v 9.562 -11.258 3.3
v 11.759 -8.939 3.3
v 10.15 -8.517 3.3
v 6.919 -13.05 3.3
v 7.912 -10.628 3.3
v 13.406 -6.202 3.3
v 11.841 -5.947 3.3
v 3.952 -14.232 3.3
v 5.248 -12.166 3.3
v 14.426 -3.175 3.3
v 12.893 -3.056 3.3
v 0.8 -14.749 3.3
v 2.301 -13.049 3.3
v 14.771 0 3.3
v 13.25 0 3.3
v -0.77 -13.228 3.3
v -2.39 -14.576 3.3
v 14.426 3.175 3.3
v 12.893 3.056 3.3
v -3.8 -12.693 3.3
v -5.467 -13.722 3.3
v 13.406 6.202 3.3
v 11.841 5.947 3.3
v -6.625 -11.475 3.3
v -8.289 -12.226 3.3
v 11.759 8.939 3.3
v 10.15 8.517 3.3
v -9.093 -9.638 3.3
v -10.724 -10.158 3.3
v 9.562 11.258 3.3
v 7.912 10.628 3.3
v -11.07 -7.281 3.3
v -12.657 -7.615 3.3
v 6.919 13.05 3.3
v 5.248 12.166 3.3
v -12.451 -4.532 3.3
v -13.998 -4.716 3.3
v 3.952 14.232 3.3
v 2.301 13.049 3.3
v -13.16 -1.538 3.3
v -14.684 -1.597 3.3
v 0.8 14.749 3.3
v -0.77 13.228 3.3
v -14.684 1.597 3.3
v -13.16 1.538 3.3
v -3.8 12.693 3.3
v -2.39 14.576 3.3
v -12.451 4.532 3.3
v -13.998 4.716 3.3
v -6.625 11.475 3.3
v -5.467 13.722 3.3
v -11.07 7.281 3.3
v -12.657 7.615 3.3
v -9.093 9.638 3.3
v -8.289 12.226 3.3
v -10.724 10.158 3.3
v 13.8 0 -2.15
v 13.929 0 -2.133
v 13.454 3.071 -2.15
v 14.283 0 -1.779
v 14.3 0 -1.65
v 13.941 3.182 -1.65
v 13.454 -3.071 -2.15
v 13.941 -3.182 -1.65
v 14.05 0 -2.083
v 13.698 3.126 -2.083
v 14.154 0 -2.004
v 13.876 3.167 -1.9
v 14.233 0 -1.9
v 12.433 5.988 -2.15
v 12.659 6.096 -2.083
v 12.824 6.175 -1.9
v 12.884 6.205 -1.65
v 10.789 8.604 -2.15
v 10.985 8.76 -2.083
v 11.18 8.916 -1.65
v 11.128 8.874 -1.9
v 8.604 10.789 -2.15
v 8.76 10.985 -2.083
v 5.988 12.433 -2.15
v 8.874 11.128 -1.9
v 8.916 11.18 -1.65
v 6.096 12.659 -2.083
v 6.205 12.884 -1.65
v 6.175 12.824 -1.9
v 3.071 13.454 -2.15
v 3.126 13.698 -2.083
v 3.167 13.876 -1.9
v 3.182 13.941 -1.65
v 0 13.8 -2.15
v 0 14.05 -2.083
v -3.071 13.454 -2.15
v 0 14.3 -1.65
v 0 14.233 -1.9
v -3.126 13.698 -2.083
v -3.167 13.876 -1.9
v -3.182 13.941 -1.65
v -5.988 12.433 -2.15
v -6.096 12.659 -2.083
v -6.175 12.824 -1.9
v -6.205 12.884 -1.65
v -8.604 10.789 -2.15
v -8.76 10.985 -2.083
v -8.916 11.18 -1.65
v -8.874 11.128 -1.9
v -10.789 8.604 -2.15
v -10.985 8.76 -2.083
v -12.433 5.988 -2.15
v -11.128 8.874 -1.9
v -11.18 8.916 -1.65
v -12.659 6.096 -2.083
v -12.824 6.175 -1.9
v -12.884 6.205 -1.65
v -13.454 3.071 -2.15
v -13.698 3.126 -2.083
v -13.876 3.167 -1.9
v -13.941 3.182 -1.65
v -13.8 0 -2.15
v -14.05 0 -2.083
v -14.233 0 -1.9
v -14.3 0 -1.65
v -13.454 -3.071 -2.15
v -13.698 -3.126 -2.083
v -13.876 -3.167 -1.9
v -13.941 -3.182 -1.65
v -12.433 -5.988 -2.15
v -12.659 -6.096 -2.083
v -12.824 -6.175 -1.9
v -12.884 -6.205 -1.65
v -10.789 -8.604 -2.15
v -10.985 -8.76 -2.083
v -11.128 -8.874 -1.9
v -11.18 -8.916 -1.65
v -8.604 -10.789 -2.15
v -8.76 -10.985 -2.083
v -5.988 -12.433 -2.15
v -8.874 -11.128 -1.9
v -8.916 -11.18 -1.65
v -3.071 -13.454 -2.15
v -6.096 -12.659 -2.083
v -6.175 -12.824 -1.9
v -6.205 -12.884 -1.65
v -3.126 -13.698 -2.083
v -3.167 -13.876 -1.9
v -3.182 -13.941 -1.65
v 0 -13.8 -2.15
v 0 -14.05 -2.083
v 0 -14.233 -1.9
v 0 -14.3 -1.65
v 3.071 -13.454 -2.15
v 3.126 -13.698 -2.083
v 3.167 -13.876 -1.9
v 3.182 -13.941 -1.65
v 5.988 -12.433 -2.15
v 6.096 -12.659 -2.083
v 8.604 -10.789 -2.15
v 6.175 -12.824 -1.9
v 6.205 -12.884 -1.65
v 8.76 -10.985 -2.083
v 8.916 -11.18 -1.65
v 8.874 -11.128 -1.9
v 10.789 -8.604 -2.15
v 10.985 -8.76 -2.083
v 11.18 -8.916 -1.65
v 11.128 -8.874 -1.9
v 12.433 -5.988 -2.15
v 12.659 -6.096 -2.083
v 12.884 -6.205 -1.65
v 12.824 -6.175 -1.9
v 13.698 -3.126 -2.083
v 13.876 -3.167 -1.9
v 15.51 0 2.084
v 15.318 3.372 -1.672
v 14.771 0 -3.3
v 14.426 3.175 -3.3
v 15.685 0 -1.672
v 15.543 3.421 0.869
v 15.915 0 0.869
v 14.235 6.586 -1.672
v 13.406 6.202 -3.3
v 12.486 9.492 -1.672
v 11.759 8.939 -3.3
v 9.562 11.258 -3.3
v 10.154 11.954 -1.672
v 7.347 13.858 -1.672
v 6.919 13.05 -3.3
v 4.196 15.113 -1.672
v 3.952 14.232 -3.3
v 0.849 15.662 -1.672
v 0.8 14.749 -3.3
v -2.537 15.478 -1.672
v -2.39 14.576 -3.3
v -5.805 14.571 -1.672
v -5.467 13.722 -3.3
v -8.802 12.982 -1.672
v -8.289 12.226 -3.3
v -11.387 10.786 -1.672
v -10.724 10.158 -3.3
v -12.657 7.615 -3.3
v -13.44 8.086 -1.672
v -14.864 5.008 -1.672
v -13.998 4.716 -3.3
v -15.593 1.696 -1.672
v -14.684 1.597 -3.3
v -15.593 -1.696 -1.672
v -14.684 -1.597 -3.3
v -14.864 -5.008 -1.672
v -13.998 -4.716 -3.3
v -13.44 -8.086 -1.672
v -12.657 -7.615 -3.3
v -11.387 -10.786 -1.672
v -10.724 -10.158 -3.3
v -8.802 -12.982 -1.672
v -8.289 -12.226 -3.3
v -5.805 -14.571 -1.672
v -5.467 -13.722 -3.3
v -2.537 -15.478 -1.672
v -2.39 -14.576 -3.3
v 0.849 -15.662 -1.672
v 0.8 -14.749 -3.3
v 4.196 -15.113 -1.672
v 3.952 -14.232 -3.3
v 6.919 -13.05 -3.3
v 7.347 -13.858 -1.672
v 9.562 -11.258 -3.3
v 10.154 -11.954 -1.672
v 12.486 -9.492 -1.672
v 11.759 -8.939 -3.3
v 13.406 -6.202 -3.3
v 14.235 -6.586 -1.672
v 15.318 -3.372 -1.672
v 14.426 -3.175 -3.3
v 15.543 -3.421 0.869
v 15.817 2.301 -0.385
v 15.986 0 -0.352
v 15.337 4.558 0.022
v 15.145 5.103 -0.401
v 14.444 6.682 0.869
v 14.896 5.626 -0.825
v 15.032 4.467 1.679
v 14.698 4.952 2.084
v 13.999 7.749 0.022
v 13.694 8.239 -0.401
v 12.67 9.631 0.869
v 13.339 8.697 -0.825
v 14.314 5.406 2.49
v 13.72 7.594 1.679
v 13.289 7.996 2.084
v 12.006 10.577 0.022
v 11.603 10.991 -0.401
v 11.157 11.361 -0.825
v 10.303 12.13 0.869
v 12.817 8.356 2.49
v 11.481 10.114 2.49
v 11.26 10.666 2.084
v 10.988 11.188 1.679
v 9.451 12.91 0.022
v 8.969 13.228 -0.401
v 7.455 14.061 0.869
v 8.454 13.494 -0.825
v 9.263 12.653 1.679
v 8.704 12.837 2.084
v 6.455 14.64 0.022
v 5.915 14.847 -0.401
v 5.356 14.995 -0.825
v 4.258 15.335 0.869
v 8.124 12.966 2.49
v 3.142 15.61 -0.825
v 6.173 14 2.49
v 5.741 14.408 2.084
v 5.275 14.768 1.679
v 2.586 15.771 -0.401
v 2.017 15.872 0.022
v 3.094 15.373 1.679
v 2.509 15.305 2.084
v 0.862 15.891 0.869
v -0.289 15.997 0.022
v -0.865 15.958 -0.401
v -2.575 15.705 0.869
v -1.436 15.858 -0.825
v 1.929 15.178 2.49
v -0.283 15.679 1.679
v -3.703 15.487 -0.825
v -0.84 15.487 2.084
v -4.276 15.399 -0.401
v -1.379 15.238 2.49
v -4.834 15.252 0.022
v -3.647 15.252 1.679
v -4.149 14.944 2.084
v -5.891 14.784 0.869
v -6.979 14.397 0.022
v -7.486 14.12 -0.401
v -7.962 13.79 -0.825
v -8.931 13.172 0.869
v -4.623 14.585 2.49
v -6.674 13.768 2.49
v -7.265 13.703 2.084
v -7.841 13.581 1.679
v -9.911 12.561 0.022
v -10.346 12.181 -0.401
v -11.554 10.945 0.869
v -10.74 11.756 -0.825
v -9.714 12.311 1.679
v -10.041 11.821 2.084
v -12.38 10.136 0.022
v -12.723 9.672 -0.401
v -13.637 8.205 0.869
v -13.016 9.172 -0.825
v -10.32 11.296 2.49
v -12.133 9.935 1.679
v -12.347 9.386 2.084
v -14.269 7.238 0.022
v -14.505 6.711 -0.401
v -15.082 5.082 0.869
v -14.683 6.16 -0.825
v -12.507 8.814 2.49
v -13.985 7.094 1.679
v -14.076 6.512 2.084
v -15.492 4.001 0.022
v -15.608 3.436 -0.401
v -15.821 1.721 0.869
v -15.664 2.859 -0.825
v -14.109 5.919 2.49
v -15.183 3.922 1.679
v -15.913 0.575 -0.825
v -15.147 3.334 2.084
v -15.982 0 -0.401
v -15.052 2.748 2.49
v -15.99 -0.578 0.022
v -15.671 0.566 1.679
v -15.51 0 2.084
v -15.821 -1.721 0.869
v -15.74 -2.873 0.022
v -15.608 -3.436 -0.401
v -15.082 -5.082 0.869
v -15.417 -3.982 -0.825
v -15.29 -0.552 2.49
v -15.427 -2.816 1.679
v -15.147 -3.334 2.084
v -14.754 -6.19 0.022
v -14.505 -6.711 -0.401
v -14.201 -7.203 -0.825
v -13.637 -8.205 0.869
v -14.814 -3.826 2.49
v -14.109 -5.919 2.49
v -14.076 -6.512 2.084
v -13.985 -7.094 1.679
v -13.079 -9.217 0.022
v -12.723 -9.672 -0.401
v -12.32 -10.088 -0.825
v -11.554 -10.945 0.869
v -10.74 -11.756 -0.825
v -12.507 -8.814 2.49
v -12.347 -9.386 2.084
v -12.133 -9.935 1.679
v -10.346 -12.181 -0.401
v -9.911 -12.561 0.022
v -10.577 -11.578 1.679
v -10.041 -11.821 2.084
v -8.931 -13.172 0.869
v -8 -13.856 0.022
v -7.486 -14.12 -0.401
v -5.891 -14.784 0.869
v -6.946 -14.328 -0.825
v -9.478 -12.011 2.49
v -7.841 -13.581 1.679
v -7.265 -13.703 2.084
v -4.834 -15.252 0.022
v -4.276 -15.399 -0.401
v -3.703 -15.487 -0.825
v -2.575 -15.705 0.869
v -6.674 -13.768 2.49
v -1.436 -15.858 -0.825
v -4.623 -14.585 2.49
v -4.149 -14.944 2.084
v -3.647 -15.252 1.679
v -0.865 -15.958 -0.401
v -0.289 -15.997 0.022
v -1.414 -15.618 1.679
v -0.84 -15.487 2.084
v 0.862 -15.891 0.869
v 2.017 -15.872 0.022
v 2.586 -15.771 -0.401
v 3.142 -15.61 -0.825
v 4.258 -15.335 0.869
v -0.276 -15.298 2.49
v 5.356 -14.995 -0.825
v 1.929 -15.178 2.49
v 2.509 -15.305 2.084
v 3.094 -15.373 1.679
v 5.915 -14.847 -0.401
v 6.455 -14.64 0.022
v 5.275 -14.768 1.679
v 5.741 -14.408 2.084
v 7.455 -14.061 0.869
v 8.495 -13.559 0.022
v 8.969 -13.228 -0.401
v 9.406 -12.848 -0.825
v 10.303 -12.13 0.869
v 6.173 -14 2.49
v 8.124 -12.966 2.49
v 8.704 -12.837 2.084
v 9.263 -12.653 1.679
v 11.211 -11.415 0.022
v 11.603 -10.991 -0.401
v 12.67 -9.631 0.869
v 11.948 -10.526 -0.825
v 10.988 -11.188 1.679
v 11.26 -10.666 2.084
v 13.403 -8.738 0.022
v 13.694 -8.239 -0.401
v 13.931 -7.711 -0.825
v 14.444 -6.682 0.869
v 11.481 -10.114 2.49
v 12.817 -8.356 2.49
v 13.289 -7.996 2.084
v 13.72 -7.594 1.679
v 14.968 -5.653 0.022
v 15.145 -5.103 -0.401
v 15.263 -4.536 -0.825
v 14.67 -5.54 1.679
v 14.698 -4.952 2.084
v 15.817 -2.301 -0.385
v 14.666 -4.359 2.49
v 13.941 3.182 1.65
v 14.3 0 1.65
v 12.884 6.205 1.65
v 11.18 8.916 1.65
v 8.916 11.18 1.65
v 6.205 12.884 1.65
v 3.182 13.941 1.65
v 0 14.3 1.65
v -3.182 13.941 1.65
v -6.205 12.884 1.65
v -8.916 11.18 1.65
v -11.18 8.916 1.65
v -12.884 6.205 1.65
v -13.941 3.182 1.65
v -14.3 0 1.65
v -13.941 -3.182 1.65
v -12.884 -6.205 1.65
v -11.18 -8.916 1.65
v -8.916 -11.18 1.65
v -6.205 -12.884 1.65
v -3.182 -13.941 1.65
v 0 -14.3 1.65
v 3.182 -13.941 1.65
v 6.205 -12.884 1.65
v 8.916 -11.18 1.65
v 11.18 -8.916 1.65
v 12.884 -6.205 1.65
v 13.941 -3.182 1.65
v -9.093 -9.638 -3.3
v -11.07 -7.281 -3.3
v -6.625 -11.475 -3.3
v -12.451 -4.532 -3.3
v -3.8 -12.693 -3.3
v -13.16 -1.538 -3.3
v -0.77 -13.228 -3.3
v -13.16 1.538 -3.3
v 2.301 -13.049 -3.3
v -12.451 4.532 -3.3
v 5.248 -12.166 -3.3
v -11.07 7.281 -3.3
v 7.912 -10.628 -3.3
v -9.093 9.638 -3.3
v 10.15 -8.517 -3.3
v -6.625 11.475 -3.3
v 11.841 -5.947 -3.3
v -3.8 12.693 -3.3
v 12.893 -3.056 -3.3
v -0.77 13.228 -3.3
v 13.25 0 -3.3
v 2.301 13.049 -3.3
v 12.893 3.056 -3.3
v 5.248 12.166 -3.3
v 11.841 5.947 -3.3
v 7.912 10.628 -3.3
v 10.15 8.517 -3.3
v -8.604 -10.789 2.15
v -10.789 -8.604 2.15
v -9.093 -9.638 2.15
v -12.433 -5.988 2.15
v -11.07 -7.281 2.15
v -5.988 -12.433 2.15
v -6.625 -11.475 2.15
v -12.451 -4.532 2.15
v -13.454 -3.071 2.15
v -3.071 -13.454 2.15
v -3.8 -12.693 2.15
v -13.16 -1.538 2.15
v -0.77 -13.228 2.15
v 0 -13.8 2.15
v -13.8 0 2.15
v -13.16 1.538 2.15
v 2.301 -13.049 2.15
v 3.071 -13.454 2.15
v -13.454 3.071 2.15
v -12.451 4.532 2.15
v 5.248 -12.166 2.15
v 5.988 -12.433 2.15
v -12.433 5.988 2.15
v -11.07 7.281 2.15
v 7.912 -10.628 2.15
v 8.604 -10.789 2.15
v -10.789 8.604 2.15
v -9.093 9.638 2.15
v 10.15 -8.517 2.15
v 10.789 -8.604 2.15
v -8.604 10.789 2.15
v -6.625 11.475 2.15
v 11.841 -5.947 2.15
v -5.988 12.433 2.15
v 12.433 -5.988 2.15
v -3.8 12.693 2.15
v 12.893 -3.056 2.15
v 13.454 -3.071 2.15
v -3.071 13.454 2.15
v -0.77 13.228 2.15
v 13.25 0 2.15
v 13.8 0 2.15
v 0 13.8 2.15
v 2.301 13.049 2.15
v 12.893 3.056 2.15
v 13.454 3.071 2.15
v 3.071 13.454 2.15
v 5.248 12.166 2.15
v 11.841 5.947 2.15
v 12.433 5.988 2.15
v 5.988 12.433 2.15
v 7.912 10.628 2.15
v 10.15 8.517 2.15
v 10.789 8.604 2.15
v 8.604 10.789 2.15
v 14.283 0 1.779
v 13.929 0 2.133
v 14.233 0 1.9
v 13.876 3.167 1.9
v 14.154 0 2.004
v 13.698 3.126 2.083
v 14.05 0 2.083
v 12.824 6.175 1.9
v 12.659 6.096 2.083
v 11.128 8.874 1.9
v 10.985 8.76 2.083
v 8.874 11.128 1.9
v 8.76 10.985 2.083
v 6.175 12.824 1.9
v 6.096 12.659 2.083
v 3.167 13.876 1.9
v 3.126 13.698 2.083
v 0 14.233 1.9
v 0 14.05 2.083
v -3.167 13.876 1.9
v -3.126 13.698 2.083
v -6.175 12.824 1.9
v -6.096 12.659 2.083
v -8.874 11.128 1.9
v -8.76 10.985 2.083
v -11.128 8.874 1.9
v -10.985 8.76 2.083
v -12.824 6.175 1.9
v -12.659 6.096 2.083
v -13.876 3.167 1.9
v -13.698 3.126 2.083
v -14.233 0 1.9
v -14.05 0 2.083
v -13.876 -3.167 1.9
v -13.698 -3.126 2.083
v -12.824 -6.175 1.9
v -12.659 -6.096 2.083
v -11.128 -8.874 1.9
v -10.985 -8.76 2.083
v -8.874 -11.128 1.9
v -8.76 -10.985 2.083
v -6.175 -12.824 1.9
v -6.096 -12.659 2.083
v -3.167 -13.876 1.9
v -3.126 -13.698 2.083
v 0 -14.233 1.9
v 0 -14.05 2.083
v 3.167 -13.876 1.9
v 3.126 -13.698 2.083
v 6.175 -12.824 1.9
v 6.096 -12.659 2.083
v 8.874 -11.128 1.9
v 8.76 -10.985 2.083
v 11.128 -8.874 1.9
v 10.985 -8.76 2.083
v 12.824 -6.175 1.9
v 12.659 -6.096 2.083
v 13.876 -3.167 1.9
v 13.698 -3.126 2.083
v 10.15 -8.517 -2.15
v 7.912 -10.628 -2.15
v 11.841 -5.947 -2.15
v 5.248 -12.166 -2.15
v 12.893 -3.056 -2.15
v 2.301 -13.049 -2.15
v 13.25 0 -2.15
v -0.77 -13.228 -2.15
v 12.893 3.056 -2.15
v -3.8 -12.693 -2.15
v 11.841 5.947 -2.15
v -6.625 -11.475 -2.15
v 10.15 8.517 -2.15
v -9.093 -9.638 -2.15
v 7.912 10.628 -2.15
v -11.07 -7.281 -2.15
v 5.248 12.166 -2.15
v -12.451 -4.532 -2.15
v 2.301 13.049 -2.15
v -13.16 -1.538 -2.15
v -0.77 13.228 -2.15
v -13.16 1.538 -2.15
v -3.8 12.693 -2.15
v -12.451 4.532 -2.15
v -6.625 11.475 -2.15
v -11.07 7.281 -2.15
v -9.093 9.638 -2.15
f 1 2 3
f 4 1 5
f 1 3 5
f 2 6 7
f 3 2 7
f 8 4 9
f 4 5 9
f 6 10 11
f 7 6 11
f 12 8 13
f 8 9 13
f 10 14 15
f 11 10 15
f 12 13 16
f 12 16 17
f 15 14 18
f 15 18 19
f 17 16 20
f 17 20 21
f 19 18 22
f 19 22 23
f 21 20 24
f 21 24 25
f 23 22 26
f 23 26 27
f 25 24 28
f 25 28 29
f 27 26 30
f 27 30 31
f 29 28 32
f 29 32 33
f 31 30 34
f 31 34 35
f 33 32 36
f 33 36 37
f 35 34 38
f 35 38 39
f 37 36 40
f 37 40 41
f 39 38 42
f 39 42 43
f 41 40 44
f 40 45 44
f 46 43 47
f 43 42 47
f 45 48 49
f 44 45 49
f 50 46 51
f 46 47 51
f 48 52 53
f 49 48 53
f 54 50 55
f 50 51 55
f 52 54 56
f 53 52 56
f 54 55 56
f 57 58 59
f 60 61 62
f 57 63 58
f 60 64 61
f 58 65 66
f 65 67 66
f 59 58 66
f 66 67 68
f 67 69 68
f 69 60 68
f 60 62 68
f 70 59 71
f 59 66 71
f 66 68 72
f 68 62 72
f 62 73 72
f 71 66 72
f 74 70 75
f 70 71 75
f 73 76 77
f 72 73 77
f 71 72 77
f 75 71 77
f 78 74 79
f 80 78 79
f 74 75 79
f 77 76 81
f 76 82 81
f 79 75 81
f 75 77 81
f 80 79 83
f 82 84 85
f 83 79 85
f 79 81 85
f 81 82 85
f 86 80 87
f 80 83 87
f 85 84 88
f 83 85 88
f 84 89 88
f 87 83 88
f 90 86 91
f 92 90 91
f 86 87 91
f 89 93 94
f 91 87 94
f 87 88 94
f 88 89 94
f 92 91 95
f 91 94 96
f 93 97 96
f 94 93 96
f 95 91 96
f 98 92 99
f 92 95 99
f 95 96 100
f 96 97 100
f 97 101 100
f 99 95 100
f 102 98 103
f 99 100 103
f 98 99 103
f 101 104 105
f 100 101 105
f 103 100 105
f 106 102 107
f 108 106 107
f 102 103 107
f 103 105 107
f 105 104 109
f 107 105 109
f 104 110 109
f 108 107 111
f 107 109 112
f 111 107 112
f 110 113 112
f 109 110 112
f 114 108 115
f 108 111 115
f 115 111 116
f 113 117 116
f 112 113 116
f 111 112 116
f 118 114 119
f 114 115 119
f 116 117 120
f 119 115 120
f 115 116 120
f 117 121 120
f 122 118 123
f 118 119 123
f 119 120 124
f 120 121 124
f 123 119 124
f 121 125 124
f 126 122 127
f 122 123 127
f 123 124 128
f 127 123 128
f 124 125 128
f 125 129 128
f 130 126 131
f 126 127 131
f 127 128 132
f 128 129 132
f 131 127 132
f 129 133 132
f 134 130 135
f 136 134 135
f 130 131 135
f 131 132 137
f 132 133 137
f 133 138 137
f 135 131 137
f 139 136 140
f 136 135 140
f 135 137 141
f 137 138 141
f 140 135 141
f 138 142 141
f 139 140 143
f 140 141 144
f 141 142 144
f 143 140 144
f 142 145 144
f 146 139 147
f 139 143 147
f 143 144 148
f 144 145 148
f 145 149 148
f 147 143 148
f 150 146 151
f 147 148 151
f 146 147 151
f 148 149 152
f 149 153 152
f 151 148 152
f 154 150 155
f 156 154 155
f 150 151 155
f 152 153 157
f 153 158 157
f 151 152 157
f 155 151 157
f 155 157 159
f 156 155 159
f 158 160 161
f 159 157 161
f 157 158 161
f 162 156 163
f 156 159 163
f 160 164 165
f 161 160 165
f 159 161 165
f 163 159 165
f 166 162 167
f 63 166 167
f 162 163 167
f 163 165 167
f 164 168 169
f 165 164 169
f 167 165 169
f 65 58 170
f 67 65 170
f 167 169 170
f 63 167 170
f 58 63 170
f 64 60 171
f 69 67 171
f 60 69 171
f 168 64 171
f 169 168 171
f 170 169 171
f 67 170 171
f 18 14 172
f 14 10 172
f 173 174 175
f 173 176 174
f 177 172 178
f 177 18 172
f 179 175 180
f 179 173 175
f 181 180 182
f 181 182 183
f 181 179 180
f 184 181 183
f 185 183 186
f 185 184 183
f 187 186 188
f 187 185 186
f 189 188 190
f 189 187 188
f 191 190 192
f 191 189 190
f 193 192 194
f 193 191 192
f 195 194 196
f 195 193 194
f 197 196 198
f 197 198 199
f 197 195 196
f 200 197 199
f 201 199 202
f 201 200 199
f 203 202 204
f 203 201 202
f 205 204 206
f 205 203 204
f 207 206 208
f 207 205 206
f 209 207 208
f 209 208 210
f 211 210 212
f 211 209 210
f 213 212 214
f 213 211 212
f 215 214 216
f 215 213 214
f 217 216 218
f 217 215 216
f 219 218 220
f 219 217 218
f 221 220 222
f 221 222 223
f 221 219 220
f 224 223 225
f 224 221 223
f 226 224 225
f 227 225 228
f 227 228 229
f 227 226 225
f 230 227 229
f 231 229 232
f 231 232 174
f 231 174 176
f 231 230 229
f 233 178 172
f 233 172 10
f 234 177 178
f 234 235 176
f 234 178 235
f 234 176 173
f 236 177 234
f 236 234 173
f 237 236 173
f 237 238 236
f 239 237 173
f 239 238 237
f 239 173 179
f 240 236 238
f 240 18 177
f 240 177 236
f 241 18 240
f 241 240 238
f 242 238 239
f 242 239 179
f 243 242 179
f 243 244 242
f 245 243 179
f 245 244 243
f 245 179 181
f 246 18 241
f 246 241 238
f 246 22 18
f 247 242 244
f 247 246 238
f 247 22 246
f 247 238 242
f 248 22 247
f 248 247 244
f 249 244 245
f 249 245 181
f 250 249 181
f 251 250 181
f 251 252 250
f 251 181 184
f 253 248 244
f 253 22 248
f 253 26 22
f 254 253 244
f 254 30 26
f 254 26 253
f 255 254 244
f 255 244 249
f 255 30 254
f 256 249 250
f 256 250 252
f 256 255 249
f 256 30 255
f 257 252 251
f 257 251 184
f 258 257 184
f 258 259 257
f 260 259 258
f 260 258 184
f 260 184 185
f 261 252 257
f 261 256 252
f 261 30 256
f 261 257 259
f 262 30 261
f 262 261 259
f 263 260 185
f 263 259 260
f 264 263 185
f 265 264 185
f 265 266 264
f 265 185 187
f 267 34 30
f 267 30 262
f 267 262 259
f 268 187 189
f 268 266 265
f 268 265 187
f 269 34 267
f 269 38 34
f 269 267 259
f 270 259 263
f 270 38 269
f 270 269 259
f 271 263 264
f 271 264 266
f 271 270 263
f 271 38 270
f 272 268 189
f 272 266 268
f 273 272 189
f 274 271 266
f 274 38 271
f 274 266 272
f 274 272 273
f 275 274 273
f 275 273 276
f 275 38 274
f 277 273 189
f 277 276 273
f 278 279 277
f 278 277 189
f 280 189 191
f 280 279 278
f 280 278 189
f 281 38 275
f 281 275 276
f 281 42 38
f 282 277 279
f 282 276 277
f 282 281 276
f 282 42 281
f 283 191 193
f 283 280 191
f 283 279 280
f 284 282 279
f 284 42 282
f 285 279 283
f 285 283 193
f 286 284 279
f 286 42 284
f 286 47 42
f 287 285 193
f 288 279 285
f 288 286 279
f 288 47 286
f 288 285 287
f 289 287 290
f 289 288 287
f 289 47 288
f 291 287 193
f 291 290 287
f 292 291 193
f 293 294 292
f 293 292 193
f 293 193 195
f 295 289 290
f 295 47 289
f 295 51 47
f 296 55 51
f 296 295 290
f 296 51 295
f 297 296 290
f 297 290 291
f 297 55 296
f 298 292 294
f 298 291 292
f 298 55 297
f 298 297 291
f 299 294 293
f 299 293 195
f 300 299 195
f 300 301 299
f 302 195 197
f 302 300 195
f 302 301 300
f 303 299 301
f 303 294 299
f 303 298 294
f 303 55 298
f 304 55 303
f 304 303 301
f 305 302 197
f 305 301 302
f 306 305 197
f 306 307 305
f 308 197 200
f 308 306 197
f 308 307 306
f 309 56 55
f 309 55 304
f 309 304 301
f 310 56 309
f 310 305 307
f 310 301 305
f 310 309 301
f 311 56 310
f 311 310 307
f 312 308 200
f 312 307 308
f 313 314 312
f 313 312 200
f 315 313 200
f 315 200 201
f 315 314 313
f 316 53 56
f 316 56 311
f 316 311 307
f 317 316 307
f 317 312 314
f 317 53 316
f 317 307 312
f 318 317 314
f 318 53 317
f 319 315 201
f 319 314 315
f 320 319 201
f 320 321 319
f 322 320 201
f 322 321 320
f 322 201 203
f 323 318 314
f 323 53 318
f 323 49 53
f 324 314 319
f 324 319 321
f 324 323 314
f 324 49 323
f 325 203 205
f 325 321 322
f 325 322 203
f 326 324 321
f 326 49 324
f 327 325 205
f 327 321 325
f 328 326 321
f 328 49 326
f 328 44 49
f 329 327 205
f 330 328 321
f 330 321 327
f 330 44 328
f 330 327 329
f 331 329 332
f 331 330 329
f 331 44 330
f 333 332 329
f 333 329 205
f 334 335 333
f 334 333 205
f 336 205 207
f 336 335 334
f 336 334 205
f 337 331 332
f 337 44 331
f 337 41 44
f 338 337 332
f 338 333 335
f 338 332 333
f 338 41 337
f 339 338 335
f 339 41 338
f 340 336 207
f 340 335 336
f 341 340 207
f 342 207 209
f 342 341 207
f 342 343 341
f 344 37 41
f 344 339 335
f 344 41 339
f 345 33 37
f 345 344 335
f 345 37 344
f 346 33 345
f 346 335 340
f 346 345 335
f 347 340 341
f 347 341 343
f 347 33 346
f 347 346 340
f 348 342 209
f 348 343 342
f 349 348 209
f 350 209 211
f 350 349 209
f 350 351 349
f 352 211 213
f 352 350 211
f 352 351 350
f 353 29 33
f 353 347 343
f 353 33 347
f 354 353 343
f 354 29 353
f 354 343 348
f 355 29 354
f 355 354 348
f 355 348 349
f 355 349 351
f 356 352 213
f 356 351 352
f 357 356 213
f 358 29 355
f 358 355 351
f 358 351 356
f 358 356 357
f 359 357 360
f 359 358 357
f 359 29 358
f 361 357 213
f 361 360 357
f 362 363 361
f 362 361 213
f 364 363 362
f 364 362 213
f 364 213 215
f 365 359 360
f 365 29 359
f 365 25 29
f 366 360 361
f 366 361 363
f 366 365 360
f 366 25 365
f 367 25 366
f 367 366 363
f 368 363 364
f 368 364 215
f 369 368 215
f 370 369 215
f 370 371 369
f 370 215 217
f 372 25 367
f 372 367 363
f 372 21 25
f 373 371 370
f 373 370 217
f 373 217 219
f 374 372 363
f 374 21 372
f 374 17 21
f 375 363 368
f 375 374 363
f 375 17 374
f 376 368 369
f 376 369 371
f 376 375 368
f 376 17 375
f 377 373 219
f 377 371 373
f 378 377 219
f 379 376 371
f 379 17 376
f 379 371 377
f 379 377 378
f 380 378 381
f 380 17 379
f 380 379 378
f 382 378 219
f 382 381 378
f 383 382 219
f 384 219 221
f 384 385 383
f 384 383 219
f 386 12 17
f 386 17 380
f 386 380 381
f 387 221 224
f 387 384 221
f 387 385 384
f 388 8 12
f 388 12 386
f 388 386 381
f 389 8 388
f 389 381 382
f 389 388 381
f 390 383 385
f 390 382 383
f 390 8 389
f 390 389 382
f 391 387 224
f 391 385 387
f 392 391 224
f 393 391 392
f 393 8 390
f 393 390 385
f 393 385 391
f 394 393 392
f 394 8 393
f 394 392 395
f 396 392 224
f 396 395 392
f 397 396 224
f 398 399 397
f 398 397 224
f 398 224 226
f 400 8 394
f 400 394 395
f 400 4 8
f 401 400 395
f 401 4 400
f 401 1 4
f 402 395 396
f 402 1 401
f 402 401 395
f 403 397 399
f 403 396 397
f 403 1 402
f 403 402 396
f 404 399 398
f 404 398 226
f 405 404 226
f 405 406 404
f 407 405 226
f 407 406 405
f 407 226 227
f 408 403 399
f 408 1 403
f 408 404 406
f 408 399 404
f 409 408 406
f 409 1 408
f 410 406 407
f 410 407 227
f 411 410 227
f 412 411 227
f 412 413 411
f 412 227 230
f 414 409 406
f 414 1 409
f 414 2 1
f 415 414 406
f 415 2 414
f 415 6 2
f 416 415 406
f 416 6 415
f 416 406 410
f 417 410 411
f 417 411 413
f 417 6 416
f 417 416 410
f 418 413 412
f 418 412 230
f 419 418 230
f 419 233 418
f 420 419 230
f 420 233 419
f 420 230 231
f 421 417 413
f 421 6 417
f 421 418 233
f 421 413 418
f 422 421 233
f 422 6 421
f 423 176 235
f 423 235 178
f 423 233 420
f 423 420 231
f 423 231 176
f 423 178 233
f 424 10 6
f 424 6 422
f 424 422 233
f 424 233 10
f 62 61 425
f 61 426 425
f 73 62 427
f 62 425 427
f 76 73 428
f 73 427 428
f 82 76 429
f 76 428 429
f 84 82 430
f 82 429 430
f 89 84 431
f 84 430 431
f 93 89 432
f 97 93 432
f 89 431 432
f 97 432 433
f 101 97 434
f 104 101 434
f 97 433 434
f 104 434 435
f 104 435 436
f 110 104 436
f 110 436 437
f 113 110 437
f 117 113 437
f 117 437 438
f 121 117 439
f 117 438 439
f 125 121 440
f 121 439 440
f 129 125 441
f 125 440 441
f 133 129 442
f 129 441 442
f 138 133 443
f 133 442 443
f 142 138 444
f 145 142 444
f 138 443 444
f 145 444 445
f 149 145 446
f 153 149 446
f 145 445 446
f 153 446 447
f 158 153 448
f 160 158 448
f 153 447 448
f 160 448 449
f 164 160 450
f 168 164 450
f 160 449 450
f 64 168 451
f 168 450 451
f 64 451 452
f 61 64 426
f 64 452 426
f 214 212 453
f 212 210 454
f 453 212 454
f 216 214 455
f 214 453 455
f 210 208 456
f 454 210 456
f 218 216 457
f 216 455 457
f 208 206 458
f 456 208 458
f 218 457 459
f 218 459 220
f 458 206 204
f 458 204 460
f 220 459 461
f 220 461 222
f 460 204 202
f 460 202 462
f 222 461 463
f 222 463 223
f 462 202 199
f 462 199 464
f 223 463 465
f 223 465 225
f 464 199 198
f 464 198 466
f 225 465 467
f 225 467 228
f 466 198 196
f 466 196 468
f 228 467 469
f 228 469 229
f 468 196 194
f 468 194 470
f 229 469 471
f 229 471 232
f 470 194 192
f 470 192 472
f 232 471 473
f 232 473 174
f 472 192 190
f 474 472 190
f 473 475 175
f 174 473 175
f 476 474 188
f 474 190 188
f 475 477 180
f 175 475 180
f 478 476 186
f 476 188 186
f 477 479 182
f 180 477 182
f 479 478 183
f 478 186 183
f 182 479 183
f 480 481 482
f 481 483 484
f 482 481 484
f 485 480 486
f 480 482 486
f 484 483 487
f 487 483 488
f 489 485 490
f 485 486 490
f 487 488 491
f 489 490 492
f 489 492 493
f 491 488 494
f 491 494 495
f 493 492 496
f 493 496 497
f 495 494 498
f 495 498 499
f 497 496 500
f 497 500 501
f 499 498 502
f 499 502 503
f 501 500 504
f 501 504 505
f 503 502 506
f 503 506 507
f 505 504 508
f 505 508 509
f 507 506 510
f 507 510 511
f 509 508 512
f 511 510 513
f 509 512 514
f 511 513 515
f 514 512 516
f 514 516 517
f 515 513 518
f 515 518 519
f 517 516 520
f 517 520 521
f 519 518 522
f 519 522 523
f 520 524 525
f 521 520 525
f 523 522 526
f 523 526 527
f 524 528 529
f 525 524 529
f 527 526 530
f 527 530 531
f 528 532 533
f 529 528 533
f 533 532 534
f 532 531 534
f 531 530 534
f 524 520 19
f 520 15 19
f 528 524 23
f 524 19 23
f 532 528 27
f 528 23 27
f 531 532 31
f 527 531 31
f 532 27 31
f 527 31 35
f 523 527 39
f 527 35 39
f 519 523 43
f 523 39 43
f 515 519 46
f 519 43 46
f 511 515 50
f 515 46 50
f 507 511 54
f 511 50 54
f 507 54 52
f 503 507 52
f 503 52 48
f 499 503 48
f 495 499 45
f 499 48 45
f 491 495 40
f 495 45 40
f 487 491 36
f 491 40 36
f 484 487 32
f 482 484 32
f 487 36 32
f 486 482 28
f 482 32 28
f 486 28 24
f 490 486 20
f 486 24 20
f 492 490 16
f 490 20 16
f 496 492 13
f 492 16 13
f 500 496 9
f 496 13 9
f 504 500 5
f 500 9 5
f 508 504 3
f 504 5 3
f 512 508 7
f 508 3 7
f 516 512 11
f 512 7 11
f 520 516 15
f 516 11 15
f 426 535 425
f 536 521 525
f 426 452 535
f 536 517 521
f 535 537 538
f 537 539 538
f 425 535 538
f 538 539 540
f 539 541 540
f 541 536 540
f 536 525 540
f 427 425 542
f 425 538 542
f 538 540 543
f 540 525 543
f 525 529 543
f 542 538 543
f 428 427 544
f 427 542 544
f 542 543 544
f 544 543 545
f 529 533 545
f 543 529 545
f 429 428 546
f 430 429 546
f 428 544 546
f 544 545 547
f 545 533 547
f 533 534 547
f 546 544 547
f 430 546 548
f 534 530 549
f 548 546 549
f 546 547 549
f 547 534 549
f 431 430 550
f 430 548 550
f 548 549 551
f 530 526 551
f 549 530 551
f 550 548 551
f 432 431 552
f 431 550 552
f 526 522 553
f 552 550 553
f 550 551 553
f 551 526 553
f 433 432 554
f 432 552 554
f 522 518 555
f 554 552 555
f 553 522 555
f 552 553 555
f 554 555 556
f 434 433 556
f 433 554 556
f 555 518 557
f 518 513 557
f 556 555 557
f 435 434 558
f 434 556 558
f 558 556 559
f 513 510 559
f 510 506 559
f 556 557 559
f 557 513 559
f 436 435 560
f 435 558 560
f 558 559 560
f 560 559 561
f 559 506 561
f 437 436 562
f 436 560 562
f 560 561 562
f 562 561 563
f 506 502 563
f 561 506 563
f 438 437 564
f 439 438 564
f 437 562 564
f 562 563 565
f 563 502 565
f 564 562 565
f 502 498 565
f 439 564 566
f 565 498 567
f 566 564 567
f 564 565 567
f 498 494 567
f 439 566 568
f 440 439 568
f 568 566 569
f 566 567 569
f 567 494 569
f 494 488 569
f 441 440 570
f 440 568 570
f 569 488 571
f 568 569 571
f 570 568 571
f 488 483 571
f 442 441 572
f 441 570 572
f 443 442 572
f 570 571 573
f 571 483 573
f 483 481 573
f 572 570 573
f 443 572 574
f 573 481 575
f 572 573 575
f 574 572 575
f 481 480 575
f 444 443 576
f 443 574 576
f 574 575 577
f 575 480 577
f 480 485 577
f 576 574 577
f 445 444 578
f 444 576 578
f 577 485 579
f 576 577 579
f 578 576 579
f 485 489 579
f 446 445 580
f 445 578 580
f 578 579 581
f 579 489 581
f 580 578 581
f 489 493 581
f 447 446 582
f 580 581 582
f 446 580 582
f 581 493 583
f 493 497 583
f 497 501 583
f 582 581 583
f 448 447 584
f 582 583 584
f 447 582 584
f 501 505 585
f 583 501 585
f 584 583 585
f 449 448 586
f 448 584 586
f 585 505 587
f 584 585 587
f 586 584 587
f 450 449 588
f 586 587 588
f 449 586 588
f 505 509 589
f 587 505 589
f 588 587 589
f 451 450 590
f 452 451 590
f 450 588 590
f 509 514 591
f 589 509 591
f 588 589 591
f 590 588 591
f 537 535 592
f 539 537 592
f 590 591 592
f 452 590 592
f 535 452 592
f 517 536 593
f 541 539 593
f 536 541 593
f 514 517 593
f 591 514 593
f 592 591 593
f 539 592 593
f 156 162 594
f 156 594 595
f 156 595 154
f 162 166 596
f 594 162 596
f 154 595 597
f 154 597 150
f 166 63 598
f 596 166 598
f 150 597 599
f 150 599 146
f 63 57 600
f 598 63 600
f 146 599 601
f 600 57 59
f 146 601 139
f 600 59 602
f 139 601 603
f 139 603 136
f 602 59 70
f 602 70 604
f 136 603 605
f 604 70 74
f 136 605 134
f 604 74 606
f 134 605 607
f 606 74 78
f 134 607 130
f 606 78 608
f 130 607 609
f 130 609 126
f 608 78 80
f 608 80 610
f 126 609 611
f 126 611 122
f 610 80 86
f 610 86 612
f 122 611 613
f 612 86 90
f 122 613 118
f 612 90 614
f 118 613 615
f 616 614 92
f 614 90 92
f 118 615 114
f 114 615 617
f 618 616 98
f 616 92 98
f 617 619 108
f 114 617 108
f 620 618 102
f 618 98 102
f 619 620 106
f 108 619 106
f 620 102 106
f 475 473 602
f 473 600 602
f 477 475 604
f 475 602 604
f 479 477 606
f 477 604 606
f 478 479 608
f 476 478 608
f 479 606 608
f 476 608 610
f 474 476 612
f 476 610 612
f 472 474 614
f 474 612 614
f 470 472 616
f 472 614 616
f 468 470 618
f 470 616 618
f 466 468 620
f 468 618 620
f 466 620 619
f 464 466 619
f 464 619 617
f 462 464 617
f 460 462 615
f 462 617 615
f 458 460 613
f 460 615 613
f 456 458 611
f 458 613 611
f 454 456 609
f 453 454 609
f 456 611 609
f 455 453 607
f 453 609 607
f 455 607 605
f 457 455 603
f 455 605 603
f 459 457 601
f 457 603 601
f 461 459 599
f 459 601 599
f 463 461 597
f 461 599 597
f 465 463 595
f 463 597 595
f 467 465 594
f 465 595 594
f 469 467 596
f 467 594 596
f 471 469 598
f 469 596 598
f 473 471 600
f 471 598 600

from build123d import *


with BuildPart() as part:
    # Croquis1 → Revolución1 (revolve)
    with BuildSketch(Plane(origin=(0, 0, 0), x_dir=(1, 0, 0), z_dir=(0, 1, 0))):
        with BuildLine():
            Line((14.3, 1.65), (14.3, -1.65))
            ThreePointArc((14.3, -1.65), (14.153553391, -2.003553391), (13.8, -2.15))
            Line((13.8, -2.15), (13.25, -2.15))
            Line((13.25, -2.15), (13.25, -3.3))
            Line((13.25, -3.3), (14.3, -3.3))
            Line((14.3, -3.3), (14.770844965, -3.3))
            add(Edge.make_bspline(
                [(14.770844965, 3.3), (17.229155035, 0), (14.770844965, -3.3)],
                knots=[0, 0, 0, 1, 1, 1], degree=2))
            Line((14.770844965, 3.3), (14.3, 3.3))
            Line((14.3, 3.3), (13.25, 3.3))
            Line((13.25, 3.3), (13.25, 2.15))
            Line((13.25, 2.15), (13.8, 2.15))
            ThreePointArc((13.8, 2.15), (14.153553391, 2.003553391), (14.3, 1.65))
        make_face()
    revolve(axis=Axis((0, 0, -4.621416215), (0, 0, 1)))


solid = part.part
